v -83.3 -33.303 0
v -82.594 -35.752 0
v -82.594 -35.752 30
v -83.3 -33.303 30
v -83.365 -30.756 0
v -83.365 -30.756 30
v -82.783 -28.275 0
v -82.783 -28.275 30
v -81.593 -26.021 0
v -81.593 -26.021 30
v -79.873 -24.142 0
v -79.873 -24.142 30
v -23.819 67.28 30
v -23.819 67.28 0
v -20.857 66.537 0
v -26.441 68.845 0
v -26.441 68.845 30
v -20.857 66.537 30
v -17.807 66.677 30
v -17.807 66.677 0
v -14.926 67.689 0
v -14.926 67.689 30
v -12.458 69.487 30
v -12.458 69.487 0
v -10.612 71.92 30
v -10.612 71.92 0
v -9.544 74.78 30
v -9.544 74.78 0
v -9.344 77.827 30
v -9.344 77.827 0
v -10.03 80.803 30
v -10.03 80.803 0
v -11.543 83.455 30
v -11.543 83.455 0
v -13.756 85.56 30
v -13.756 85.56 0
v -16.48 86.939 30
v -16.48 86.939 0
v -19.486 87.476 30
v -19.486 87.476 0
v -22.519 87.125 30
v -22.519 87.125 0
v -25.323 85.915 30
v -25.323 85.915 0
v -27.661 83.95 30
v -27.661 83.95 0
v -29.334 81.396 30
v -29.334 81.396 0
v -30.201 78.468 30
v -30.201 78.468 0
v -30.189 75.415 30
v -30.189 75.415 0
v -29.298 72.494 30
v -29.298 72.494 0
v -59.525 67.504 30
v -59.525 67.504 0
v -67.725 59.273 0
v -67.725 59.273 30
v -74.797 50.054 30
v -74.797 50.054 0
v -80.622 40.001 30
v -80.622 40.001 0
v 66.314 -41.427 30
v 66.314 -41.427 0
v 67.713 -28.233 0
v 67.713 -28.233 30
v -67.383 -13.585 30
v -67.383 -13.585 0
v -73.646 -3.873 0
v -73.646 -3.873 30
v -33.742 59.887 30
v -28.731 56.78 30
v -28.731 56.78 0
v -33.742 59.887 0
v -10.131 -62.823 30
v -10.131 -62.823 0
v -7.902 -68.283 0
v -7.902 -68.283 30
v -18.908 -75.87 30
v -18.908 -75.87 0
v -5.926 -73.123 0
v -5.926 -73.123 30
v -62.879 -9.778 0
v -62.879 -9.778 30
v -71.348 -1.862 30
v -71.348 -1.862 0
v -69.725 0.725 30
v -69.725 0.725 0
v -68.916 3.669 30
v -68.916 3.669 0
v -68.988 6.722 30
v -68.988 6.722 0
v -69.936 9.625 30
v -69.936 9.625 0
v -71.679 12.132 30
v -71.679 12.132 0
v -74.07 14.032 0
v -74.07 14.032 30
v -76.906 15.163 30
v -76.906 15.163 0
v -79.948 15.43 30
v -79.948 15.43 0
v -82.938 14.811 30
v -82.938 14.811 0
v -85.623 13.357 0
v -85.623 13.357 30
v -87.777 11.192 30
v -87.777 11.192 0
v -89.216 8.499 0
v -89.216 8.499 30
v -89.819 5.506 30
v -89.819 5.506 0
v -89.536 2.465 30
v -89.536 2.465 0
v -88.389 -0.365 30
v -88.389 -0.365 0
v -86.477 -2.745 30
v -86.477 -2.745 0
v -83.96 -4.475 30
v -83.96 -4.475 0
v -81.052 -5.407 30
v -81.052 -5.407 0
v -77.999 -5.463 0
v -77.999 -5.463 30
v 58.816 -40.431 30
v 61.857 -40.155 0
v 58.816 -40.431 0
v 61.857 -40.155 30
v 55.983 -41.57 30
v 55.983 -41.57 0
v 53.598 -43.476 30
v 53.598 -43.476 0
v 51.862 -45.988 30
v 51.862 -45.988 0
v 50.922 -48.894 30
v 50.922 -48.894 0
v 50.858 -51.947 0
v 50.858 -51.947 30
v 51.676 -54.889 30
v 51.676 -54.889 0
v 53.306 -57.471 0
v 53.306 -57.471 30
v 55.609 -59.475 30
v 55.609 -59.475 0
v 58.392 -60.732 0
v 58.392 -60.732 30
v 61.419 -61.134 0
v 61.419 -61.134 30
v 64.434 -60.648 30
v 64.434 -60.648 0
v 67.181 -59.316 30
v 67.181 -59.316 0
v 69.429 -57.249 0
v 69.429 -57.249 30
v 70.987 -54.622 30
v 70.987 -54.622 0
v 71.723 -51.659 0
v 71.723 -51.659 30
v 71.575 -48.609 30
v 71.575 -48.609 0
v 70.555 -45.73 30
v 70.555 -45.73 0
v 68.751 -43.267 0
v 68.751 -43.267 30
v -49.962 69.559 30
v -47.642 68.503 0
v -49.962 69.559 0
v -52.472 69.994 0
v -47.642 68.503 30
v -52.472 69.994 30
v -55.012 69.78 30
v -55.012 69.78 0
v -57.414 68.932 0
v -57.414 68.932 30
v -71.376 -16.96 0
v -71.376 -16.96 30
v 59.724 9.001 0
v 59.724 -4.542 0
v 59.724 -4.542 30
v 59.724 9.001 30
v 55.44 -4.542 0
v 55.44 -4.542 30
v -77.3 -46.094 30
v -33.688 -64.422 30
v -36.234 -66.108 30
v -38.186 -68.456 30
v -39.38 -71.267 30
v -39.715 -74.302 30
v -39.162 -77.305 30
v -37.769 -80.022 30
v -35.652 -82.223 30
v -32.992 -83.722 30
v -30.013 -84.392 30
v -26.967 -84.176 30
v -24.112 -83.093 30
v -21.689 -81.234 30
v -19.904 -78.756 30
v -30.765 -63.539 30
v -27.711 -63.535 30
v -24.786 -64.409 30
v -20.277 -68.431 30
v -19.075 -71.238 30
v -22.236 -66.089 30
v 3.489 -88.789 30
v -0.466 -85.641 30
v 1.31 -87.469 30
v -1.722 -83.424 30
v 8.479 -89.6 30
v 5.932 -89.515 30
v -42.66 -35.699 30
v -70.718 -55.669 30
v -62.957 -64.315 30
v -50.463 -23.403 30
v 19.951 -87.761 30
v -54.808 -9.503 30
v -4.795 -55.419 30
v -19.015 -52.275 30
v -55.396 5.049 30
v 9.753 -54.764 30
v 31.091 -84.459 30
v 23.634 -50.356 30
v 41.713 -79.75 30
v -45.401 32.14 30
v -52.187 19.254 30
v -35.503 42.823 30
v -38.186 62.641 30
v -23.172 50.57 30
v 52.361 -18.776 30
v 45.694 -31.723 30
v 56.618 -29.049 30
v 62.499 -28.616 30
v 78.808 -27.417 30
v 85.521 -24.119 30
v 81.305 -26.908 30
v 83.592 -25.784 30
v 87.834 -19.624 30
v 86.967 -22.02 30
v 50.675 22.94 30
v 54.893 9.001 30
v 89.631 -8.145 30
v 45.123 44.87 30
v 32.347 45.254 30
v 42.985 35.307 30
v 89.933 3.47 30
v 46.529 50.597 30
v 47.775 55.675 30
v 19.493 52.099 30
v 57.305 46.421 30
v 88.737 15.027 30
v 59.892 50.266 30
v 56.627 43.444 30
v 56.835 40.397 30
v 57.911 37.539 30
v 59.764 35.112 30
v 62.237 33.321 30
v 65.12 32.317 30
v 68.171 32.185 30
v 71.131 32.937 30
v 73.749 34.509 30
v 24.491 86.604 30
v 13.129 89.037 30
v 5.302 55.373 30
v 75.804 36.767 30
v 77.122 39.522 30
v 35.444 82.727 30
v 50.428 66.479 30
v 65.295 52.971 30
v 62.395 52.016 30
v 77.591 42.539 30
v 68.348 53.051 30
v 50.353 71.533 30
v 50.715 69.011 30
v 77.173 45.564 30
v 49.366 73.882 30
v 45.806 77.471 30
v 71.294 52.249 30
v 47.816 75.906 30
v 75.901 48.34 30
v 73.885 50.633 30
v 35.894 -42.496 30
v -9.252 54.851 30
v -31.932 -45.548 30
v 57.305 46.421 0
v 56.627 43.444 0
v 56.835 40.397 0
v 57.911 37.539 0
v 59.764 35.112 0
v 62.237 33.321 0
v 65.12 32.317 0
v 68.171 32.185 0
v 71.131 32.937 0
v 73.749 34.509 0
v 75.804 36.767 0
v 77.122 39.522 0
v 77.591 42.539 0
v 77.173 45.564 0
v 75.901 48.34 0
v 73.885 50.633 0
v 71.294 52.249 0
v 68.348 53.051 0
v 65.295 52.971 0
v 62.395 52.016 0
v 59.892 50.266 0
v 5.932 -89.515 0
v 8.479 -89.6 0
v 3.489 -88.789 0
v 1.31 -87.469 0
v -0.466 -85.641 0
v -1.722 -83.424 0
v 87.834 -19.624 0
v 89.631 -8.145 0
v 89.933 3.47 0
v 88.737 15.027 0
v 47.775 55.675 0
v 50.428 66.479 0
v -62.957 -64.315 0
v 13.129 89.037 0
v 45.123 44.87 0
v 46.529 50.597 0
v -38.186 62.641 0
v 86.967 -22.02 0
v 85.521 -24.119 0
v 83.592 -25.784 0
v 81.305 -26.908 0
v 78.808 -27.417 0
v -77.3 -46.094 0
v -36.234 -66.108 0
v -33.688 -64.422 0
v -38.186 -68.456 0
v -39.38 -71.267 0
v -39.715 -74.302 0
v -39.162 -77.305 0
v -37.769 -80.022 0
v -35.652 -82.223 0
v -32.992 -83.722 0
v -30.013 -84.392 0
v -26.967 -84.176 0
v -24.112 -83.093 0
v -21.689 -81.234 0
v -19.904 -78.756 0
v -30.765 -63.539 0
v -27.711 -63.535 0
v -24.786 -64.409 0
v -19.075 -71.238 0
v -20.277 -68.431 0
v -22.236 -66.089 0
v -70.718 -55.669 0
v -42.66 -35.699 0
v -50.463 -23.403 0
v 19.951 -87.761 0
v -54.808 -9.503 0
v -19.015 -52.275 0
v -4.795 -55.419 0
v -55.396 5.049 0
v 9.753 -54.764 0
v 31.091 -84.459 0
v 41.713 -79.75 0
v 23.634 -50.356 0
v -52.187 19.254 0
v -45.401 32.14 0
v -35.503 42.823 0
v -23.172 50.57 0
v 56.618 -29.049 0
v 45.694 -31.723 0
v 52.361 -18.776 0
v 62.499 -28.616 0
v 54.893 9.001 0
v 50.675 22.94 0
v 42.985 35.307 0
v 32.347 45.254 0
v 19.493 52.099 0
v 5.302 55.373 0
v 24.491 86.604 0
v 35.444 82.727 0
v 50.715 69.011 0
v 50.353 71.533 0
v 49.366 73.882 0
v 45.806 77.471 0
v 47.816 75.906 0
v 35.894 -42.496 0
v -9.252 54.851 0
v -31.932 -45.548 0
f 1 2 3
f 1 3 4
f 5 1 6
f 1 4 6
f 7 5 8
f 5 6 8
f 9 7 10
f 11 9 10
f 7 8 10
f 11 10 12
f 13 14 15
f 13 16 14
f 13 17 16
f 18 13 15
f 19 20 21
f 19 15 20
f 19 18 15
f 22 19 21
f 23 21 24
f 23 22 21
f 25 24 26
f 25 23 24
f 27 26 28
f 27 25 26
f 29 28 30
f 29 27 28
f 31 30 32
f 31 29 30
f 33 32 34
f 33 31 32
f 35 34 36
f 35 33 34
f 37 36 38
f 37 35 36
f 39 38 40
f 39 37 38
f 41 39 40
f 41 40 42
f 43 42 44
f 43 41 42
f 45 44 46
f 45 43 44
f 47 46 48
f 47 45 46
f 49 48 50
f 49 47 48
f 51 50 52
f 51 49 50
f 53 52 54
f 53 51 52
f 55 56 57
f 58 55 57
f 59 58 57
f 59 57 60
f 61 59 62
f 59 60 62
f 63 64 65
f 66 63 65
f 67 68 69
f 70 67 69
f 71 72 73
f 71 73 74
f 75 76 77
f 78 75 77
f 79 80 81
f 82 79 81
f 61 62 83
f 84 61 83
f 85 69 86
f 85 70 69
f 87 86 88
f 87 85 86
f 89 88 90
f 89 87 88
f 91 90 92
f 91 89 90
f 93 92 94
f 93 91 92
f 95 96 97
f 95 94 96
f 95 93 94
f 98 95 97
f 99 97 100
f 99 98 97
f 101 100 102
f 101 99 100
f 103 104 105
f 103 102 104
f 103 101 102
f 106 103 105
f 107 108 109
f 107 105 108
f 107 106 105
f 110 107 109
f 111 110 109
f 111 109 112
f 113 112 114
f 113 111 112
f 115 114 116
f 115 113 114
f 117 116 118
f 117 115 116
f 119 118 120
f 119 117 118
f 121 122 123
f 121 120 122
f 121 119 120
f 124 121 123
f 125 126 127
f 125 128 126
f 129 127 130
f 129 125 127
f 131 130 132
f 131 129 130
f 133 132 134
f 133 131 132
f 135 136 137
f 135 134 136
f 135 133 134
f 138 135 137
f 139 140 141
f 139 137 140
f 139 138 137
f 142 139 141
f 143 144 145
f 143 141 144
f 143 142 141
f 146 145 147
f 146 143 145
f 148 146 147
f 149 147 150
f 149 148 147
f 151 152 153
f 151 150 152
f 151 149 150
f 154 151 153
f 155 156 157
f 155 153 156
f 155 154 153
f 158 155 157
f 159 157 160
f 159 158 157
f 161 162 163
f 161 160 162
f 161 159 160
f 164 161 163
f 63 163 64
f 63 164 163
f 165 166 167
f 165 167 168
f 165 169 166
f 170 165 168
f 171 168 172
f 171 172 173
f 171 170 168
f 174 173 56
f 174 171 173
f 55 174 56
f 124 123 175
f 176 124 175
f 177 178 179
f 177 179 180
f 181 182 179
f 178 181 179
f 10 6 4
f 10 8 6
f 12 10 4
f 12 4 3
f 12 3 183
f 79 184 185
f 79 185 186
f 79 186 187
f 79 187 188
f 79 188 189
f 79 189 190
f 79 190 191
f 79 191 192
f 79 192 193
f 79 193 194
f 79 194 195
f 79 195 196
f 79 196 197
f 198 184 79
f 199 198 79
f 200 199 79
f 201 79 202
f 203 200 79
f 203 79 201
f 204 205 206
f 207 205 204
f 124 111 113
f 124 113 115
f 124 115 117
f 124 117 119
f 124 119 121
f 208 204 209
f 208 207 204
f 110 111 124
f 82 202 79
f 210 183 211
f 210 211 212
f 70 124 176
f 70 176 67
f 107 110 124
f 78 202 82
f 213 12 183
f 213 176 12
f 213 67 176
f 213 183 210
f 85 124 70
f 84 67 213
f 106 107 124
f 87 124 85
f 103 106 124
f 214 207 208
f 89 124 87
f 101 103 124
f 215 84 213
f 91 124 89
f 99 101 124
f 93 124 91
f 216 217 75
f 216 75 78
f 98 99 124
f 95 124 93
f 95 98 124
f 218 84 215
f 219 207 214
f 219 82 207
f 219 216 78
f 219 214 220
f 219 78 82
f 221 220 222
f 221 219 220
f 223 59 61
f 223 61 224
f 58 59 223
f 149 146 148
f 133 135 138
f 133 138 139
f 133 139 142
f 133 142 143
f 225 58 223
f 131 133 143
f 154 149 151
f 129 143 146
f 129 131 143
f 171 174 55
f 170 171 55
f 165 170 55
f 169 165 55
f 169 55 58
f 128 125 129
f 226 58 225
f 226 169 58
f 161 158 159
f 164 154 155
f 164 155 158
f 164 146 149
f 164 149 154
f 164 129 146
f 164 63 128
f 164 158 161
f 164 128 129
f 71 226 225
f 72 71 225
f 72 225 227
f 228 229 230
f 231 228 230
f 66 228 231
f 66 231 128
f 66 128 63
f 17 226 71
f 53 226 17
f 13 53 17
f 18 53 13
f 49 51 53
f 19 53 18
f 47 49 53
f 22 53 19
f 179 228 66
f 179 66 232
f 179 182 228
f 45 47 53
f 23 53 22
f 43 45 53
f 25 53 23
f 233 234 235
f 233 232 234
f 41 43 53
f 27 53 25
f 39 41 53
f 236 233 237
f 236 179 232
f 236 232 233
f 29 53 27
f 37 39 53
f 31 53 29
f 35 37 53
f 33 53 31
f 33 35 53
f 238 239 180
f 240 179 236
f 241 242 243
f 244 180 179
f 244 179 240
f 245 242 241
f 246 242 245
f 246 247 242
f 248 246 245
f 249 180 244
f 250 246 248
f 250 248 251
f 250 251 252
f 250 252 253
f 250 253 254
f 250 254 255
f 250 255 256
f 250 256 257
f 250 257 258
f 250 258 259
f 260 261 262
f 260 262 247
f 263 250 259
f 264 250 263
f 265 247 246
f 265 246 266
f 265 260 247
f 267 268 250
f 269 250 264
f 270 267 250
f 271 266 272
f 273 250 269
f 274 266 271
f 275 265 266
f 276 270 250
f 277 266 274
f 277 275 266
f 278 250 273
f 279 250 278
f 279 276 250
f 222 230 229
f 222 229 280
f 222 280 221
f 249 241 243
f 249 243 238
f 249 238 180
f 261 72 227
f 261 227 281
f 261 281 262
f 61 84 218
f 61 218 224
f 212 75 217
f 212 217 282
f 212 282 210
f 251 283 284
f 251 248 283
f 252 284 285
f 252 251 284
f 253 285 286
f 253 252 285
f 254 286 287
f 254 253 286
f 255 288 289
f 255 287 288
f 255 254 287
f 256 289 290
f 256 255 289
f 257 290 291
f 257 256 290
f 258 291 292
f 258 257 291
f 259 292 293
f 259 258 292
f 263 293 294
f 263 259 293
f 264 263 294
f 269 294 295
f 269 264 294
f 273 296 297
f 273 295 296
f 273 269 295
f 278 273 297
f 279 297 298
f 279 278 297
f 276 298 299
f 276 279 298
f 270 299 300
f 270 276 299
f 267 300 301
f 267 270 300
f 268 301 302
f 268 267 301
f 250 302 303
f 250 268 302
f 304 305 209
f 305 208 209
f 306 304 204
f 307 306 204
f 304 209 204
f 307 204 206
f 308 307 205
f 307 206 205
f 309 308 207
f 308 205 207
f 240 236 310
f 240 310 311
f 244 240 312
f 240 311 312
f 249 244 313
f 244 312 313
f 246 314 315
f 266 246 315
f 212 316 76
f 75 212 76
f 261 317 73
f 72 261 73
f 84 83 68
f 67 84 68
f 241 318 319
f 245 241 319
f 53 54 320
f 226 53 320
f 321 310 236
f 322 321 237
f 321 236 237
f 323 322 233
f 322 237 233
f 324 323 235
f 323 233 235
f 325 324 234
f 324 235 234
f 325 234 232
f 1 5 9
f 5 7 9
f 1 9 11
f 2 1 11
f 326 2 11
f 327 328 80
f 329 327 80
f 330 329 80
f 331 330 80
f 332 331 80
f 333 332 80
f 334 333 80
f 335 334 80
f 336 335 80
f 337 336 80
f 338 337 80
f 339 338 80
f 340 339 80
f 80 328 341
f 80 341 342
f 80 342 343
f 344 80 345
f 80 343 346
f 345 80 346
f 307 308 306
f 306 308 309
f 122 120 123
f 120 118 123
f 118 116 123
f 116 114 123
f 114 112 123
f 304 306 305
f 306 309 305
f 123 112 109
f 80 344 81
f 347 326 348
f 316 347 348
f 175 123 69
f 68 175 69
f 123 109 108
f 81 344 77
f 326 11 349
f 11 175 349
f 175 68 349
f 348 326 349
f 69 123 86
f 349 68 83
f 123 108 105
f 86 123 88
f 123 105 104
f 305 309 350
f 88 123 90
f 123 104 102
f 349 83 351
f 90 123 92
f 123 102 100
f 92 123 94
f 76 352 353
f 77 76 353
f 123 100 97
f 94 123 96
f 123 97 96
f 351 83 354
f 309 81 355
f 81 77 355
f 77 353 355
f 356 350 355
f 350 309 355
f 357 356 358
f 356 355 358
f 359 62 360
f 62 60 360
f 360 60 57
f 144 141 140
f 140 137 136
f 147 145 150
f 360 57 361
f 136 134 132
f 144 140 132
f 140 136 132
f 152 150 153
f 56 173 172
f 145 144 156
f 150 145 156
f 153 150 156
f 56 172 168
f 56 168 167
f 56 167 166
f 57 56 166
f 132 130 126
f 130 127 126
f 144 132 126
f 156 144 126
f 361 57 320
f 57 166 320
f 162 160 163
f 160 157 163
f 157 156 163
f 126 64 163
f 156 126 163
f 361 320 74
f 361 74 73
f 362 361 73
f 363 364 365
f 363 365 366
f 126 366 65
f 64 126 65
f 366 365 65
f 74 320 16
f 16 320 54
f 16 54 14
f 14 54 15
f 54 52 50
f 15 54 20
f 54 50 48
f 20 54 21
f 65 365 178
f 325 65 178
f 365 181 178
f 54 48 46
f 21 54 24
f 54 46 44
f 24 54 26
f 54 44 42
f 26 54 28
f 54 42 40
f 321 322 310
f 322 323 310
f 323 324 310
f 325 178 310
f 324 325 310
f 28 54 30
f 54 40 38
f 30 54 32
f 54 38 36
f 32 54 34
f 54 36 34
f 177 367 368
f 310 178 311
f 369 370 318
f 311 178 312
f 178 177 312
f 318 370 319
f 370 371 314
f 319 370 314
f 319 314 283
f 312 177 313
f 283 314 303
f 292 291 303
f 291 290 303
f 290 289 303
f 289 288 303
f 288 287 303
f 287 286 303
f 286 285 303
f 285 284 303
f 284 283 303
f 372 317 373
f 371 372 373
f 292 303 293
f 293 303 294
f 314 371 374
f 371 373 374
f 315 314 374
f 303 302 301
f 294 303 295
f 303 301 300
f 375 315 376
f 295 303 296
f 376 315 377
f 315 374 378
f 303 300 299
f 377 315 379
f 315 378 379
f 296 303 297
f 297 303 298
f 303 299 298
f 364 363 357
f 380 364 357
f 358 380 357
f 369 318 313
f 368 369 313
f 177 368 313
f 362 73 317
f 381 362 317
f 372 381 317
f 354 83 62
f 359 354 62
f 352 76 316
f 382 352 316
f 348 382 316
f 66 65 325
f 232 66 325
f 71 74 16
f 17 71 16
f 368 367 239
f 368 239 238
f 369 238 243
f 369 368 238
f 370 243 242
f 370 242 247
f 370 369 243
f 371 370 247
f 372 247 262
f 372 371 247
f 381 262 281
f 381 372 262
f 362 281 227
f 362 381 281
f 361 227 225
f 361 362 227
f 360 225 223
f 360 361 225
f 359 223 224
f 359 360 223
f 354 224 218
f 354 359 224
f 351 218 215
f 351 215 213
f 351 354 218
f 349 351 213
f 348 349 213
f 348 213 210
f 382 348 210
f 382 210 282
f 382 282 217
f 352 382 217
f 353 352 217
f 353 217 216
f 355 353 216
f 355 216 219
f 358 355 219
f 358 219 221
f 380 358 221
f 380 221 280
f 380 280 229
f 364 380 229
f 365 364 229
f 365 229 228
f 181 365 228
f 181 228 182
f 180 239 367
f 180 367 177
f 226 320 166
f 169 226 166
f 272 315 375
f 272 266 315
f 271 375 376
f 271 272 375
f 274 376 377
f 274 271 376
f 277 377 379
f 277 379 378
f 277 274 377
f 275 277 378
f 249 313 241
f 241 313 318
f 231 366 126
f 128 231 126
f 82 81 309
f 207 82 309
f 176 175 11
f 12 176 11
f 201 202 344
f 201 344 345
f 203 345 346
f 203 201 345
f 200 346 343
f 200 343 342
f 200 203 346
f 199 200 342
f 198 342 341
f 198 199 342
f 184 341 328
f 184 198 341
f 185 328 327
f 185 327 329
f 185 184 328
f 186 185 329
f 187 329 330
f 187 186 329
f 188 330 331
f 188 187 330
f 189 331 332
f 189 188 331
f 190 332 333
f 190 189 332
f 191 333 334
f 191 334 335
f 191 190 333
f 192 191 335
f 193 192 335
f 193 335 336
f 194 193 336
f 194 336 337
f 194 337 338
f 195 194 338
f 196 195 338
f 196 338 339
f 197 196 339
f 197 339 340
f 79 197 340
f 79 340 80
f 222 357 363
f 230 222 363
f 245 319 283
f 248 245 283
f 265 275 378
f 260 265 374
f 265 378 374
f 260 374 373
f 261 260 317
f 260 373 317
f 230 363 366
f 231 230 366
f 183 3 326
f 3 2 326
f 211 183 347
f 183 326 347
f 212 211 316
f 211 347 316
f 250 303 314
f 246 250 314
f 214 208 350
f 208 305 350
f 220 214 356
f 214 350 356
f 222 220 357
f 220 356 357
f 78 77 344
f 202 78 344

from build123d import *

# Parameters (mm, degrees)
SKETCH1_R             = 90
BOSS_EXTRUDE1_DEPTH   = 30
CUT_EXTRUDE4_DEPTH    = 30
SKETCH5_R             = 55.626023842
CUT_EXTRUDE5_DEPTH    = 30
SKETCH6_W             = 7.386739777
SKETCH6_H             = 13.542356258
CUT_EXTRUDE6_DEPTH    = 30
FILLET1_R             = 10
SKETCH8_R             = 10.49811893
BOSS_EXTRUDE2_DEPTH   = 30
BOSS_EXTRUDE2_2_DEPTH = 30
BOSS_EXTRUDE2_3_DEPTH = 30
BOSS_EXTRUDE2_4_DEPTH = 30
BOSS_EXTRUDE2_5_DEPTH = 30
BOSS_EXTRUDE4_DEPTH   = 30


with BuildPart() as part:
    # Sketch1 → Boss-Extrude1 (new body)
    with BuildSketch(Plane.XY):
        Circle(SKETCH1_R)
    extrude(amount=BOSS_EXTRUDE1_DEPTH)

    # Sketch4 → Cut-Extrude4 (cut)
    with BuildSketch(Plane.XY):
        with BuildLine():
            Line((88.736574157, 15.027322012), (45.122701232, 44.870398789))
            Line((45.122701232, 44.870398789), (52.120312028, 73.372154623))
            ThreePointArc((52.120312028, 73.372154623), (76.231197482, 47.84145201), (88.736574157, 15.027322012))
        make_face()
        with BuildLine():
            Line((41.712941959, -79.749799204), (56.61796667, -29.048523269))
            Line((56.61796667, -29.048523269), (85.887127938, -26.896119693))
            ThreePointArc((85.887127938, -26.896119693), (69.056660207, -57.716355404), (41.712941959, -79.749799204))
        make_face()
        with BuildLine():
            Line((-62.956558256, -64.315408516), (-10.130873456, -62.823373493))
            Line((-10.130873456, -62.823373493), (0.960852233, -89.994870759))
            ThreePointArc((0.960852233, -89.994870759), (-33.551834325, -83.512121356), (-62.956558256, -64.315408516))
        make_face()
        with BuildLine():
            Line((-80.622234776, 40.000690741), (-62.879190802, -9.778456837))
            Line((-62.879190802, -9.778456837), (-85.2932886, -28.723769249))
            ThreePointArc((-85.2932886, -28.723769249), (-89.792834204, 6.103025933), (-80.622234776, 40.000690741))
        make_face()
        with BuildLine():
            Line((13.129276916, 89.037194967), (-28.730603645, 56.77995481))
            Line((-28.730603645, 56.77995481), (-53.6750036, 72.242605078))
            ThreePointArc((-53.6750036, 72.242605078), (-21.943189159, 87.283998817), (13.129276916, 89.037194967))
        make_face()
    extrude(amount=CUT_EXTRUDE4_DEPTH, mode=Mode.SUBTRACT)

    # Sketch5 → Cut-Extrude5 (cut)
    with BuildSketch(Plane.XY):
        Circle(SKETCH5_R)
    extrude(amount=CUT_EXTRUDE5_DEPTH, mode=Mode.SUBTRACT)

    # Sketch6 → Cut-Extrude6 (cut)
    with BuildSketch(Plane.XY):
        with Locations((56.030331415, 2.229633356)):
            Rectangle(SKETCH6_W, SKETCH6_H)
    extrude(amount=CUT_EXTRUDE6_DEPTH, mode=Mode.SUBTRACT)

    # Fillet1
    fillet1_edges = [part.edges().sort_by_distance(p)[0] for p in [
        (85.887127938, -26.896119693, 15),
        (0.960852233, -89.994870759, 15),
        (-85.2932886, -28.723769249, 15),
        (-53.6750036, 72.242605078, 15),
        (52.120312028, 73.372154623, 15),
    ]]
    fillet(fillet1_edges, radius=FILLET1_R)



with BuildPart() as body_2:
    # Sketch8 → Boss-Extrude2 (new body)
    with BuildSketch(Plane.XY.offset(30)):
        with Locations((67.093562258, 42.627771692)):
            Circle(SKETCH8_R)
    extrude(amount=-BOSS_EXTRUDE2_DEPTH)


with BuildPart() as body_3:
    # Sketch8 → Boss-Extrude2 2 (new body)
    with BuildSketch(Plane.XY.offset(30)):
        with Locations((61.274470993, -50.637063702)):
            Circle(SKETCH8_R)
    extrude(amount=-BOSS_EXTRUDE2_2_DEPTH)


with BuildPart() as body_4:
    # Sketch8 → Boss-Extrude2 3 (new body)
    with BuildSketch(Plane.XY.offset(30)):
        with Locations((-29.223856541, -73.92319815)):
            Circle(SKETCH8_R)
    extrude(amount=-BOSS_EXTRUDE2_3_DEPTH)


with BuildPart() as body_5:
    # Sketch8 → Boss-Extrude2 4 (new body)
    with BuildSketch(Plane.XY.offset(30)):
        with Locations((-79.335807618, 4.950014688)):
            Circle(SKETCH8_R)
    extrude(amount=-BOSS_EXTRUDE2_4_DEPTH)


with BuildPart() as body_6:
    # Sketch8 → Boss-Extrude2 5 (new body)
    with BuildSketch(Plane.XY.offset(30)):
        with Locations((-19.808369092, 76.982475472)):
            Circle(SKETCH8_R)
    extrude(amount=-BOSS_EXTRUDE2_5_DEPTH)


with BuildPart() as part_1:
    add(part.part)

    add(body_2.part)  # Boss-Extrude4 merges body 2

    add(body_3.part)  # Boss-Extrude4 merges body 3

    add(body_4.part)  # Boss-Extrude4 merges body 4

    add(body_5.part)  # Boss-Extrude4 merges body 5

    add(body_6.part)  # Boss-Extrude4 merges body 6
    # Sketch9 → Boss-Extrude4 (add)
    with BuildSketch(Plane.XY):
        with BuildLine():
            Line((-29.298411126, 72.493644527), (-38.186452488, 62.641490221))
            Line((-38.186452488, 62.641490221), (-33.742460025, 59.886727574))
            Line((-33.742460025, 59.886727574), (-26.440954647, 68.84495067))
            ThreePointArc((-26.440954647, 68.84495067), (-28.073538286, 70.509649254), (-29.298411126, 72.493644527))
        make_face()
        with BuildLine():
            Line((46.528668919, 50.597003041), (57.304734615, 46.421101948))
            ThreePointArc((57.304734615, 46.421101948), (58.383460962, 48.48820141), (59.891846071, 50.266212961))
            Line((59.891846071, 50.266212961), (47.775334692, 55.674759504))
            Line((47.775334692, 55.674759504), (46.528668919, 50.597003041))
        make_face()
        with BuildLine():
            Line((62.498758869, -28.616059966), (61.857228356, -40.15513187))
            ThreePointArc((61.857228356, -40.15513187), (64.156501542, -40.54229273), (66.313607647, -41.427416431))
            Line((66.313607647, -41.427416431), (67.713233152, -28.232596532))
            Line((67.713233152, -28.232596532), (62.498758869, -28.616059966))
        make_face()
        with BuildLine():
            Line((-7.902311684, -68.282700724), (-19.074865041, -71.238338267))
            ThreePointArc((-19.074865041, -71.238338267), (-18.73256241, -73.544716298), (-18.907782629, -75.869764382))
            Line((-18.907782629, -75.869764382), (-5.926255116, -73.123463752))
            Line((-5.926255116, -73.123463752), (-7.902311684, -68.282700724))
        make_face()
        with BuildLine():
            Line((-67.382656079, -13.584969925), (-73.646143282, -3.872582481))
            ThreePointArc((-73.646143282, -3.872582481), (-75.733861807, -4.910841636), (-77.999259963, -5.462676675))
            Line((-77.999259963, -5.462676675), (-71.375860239, -16.960189442))
            Line((-71.375860239, -16.960189442), (-67.382656079, -13.584969925))
        make_face()
    extrude(amount=BOSS_EXTRUDE4_DEPTH)


solid = part_1.part
